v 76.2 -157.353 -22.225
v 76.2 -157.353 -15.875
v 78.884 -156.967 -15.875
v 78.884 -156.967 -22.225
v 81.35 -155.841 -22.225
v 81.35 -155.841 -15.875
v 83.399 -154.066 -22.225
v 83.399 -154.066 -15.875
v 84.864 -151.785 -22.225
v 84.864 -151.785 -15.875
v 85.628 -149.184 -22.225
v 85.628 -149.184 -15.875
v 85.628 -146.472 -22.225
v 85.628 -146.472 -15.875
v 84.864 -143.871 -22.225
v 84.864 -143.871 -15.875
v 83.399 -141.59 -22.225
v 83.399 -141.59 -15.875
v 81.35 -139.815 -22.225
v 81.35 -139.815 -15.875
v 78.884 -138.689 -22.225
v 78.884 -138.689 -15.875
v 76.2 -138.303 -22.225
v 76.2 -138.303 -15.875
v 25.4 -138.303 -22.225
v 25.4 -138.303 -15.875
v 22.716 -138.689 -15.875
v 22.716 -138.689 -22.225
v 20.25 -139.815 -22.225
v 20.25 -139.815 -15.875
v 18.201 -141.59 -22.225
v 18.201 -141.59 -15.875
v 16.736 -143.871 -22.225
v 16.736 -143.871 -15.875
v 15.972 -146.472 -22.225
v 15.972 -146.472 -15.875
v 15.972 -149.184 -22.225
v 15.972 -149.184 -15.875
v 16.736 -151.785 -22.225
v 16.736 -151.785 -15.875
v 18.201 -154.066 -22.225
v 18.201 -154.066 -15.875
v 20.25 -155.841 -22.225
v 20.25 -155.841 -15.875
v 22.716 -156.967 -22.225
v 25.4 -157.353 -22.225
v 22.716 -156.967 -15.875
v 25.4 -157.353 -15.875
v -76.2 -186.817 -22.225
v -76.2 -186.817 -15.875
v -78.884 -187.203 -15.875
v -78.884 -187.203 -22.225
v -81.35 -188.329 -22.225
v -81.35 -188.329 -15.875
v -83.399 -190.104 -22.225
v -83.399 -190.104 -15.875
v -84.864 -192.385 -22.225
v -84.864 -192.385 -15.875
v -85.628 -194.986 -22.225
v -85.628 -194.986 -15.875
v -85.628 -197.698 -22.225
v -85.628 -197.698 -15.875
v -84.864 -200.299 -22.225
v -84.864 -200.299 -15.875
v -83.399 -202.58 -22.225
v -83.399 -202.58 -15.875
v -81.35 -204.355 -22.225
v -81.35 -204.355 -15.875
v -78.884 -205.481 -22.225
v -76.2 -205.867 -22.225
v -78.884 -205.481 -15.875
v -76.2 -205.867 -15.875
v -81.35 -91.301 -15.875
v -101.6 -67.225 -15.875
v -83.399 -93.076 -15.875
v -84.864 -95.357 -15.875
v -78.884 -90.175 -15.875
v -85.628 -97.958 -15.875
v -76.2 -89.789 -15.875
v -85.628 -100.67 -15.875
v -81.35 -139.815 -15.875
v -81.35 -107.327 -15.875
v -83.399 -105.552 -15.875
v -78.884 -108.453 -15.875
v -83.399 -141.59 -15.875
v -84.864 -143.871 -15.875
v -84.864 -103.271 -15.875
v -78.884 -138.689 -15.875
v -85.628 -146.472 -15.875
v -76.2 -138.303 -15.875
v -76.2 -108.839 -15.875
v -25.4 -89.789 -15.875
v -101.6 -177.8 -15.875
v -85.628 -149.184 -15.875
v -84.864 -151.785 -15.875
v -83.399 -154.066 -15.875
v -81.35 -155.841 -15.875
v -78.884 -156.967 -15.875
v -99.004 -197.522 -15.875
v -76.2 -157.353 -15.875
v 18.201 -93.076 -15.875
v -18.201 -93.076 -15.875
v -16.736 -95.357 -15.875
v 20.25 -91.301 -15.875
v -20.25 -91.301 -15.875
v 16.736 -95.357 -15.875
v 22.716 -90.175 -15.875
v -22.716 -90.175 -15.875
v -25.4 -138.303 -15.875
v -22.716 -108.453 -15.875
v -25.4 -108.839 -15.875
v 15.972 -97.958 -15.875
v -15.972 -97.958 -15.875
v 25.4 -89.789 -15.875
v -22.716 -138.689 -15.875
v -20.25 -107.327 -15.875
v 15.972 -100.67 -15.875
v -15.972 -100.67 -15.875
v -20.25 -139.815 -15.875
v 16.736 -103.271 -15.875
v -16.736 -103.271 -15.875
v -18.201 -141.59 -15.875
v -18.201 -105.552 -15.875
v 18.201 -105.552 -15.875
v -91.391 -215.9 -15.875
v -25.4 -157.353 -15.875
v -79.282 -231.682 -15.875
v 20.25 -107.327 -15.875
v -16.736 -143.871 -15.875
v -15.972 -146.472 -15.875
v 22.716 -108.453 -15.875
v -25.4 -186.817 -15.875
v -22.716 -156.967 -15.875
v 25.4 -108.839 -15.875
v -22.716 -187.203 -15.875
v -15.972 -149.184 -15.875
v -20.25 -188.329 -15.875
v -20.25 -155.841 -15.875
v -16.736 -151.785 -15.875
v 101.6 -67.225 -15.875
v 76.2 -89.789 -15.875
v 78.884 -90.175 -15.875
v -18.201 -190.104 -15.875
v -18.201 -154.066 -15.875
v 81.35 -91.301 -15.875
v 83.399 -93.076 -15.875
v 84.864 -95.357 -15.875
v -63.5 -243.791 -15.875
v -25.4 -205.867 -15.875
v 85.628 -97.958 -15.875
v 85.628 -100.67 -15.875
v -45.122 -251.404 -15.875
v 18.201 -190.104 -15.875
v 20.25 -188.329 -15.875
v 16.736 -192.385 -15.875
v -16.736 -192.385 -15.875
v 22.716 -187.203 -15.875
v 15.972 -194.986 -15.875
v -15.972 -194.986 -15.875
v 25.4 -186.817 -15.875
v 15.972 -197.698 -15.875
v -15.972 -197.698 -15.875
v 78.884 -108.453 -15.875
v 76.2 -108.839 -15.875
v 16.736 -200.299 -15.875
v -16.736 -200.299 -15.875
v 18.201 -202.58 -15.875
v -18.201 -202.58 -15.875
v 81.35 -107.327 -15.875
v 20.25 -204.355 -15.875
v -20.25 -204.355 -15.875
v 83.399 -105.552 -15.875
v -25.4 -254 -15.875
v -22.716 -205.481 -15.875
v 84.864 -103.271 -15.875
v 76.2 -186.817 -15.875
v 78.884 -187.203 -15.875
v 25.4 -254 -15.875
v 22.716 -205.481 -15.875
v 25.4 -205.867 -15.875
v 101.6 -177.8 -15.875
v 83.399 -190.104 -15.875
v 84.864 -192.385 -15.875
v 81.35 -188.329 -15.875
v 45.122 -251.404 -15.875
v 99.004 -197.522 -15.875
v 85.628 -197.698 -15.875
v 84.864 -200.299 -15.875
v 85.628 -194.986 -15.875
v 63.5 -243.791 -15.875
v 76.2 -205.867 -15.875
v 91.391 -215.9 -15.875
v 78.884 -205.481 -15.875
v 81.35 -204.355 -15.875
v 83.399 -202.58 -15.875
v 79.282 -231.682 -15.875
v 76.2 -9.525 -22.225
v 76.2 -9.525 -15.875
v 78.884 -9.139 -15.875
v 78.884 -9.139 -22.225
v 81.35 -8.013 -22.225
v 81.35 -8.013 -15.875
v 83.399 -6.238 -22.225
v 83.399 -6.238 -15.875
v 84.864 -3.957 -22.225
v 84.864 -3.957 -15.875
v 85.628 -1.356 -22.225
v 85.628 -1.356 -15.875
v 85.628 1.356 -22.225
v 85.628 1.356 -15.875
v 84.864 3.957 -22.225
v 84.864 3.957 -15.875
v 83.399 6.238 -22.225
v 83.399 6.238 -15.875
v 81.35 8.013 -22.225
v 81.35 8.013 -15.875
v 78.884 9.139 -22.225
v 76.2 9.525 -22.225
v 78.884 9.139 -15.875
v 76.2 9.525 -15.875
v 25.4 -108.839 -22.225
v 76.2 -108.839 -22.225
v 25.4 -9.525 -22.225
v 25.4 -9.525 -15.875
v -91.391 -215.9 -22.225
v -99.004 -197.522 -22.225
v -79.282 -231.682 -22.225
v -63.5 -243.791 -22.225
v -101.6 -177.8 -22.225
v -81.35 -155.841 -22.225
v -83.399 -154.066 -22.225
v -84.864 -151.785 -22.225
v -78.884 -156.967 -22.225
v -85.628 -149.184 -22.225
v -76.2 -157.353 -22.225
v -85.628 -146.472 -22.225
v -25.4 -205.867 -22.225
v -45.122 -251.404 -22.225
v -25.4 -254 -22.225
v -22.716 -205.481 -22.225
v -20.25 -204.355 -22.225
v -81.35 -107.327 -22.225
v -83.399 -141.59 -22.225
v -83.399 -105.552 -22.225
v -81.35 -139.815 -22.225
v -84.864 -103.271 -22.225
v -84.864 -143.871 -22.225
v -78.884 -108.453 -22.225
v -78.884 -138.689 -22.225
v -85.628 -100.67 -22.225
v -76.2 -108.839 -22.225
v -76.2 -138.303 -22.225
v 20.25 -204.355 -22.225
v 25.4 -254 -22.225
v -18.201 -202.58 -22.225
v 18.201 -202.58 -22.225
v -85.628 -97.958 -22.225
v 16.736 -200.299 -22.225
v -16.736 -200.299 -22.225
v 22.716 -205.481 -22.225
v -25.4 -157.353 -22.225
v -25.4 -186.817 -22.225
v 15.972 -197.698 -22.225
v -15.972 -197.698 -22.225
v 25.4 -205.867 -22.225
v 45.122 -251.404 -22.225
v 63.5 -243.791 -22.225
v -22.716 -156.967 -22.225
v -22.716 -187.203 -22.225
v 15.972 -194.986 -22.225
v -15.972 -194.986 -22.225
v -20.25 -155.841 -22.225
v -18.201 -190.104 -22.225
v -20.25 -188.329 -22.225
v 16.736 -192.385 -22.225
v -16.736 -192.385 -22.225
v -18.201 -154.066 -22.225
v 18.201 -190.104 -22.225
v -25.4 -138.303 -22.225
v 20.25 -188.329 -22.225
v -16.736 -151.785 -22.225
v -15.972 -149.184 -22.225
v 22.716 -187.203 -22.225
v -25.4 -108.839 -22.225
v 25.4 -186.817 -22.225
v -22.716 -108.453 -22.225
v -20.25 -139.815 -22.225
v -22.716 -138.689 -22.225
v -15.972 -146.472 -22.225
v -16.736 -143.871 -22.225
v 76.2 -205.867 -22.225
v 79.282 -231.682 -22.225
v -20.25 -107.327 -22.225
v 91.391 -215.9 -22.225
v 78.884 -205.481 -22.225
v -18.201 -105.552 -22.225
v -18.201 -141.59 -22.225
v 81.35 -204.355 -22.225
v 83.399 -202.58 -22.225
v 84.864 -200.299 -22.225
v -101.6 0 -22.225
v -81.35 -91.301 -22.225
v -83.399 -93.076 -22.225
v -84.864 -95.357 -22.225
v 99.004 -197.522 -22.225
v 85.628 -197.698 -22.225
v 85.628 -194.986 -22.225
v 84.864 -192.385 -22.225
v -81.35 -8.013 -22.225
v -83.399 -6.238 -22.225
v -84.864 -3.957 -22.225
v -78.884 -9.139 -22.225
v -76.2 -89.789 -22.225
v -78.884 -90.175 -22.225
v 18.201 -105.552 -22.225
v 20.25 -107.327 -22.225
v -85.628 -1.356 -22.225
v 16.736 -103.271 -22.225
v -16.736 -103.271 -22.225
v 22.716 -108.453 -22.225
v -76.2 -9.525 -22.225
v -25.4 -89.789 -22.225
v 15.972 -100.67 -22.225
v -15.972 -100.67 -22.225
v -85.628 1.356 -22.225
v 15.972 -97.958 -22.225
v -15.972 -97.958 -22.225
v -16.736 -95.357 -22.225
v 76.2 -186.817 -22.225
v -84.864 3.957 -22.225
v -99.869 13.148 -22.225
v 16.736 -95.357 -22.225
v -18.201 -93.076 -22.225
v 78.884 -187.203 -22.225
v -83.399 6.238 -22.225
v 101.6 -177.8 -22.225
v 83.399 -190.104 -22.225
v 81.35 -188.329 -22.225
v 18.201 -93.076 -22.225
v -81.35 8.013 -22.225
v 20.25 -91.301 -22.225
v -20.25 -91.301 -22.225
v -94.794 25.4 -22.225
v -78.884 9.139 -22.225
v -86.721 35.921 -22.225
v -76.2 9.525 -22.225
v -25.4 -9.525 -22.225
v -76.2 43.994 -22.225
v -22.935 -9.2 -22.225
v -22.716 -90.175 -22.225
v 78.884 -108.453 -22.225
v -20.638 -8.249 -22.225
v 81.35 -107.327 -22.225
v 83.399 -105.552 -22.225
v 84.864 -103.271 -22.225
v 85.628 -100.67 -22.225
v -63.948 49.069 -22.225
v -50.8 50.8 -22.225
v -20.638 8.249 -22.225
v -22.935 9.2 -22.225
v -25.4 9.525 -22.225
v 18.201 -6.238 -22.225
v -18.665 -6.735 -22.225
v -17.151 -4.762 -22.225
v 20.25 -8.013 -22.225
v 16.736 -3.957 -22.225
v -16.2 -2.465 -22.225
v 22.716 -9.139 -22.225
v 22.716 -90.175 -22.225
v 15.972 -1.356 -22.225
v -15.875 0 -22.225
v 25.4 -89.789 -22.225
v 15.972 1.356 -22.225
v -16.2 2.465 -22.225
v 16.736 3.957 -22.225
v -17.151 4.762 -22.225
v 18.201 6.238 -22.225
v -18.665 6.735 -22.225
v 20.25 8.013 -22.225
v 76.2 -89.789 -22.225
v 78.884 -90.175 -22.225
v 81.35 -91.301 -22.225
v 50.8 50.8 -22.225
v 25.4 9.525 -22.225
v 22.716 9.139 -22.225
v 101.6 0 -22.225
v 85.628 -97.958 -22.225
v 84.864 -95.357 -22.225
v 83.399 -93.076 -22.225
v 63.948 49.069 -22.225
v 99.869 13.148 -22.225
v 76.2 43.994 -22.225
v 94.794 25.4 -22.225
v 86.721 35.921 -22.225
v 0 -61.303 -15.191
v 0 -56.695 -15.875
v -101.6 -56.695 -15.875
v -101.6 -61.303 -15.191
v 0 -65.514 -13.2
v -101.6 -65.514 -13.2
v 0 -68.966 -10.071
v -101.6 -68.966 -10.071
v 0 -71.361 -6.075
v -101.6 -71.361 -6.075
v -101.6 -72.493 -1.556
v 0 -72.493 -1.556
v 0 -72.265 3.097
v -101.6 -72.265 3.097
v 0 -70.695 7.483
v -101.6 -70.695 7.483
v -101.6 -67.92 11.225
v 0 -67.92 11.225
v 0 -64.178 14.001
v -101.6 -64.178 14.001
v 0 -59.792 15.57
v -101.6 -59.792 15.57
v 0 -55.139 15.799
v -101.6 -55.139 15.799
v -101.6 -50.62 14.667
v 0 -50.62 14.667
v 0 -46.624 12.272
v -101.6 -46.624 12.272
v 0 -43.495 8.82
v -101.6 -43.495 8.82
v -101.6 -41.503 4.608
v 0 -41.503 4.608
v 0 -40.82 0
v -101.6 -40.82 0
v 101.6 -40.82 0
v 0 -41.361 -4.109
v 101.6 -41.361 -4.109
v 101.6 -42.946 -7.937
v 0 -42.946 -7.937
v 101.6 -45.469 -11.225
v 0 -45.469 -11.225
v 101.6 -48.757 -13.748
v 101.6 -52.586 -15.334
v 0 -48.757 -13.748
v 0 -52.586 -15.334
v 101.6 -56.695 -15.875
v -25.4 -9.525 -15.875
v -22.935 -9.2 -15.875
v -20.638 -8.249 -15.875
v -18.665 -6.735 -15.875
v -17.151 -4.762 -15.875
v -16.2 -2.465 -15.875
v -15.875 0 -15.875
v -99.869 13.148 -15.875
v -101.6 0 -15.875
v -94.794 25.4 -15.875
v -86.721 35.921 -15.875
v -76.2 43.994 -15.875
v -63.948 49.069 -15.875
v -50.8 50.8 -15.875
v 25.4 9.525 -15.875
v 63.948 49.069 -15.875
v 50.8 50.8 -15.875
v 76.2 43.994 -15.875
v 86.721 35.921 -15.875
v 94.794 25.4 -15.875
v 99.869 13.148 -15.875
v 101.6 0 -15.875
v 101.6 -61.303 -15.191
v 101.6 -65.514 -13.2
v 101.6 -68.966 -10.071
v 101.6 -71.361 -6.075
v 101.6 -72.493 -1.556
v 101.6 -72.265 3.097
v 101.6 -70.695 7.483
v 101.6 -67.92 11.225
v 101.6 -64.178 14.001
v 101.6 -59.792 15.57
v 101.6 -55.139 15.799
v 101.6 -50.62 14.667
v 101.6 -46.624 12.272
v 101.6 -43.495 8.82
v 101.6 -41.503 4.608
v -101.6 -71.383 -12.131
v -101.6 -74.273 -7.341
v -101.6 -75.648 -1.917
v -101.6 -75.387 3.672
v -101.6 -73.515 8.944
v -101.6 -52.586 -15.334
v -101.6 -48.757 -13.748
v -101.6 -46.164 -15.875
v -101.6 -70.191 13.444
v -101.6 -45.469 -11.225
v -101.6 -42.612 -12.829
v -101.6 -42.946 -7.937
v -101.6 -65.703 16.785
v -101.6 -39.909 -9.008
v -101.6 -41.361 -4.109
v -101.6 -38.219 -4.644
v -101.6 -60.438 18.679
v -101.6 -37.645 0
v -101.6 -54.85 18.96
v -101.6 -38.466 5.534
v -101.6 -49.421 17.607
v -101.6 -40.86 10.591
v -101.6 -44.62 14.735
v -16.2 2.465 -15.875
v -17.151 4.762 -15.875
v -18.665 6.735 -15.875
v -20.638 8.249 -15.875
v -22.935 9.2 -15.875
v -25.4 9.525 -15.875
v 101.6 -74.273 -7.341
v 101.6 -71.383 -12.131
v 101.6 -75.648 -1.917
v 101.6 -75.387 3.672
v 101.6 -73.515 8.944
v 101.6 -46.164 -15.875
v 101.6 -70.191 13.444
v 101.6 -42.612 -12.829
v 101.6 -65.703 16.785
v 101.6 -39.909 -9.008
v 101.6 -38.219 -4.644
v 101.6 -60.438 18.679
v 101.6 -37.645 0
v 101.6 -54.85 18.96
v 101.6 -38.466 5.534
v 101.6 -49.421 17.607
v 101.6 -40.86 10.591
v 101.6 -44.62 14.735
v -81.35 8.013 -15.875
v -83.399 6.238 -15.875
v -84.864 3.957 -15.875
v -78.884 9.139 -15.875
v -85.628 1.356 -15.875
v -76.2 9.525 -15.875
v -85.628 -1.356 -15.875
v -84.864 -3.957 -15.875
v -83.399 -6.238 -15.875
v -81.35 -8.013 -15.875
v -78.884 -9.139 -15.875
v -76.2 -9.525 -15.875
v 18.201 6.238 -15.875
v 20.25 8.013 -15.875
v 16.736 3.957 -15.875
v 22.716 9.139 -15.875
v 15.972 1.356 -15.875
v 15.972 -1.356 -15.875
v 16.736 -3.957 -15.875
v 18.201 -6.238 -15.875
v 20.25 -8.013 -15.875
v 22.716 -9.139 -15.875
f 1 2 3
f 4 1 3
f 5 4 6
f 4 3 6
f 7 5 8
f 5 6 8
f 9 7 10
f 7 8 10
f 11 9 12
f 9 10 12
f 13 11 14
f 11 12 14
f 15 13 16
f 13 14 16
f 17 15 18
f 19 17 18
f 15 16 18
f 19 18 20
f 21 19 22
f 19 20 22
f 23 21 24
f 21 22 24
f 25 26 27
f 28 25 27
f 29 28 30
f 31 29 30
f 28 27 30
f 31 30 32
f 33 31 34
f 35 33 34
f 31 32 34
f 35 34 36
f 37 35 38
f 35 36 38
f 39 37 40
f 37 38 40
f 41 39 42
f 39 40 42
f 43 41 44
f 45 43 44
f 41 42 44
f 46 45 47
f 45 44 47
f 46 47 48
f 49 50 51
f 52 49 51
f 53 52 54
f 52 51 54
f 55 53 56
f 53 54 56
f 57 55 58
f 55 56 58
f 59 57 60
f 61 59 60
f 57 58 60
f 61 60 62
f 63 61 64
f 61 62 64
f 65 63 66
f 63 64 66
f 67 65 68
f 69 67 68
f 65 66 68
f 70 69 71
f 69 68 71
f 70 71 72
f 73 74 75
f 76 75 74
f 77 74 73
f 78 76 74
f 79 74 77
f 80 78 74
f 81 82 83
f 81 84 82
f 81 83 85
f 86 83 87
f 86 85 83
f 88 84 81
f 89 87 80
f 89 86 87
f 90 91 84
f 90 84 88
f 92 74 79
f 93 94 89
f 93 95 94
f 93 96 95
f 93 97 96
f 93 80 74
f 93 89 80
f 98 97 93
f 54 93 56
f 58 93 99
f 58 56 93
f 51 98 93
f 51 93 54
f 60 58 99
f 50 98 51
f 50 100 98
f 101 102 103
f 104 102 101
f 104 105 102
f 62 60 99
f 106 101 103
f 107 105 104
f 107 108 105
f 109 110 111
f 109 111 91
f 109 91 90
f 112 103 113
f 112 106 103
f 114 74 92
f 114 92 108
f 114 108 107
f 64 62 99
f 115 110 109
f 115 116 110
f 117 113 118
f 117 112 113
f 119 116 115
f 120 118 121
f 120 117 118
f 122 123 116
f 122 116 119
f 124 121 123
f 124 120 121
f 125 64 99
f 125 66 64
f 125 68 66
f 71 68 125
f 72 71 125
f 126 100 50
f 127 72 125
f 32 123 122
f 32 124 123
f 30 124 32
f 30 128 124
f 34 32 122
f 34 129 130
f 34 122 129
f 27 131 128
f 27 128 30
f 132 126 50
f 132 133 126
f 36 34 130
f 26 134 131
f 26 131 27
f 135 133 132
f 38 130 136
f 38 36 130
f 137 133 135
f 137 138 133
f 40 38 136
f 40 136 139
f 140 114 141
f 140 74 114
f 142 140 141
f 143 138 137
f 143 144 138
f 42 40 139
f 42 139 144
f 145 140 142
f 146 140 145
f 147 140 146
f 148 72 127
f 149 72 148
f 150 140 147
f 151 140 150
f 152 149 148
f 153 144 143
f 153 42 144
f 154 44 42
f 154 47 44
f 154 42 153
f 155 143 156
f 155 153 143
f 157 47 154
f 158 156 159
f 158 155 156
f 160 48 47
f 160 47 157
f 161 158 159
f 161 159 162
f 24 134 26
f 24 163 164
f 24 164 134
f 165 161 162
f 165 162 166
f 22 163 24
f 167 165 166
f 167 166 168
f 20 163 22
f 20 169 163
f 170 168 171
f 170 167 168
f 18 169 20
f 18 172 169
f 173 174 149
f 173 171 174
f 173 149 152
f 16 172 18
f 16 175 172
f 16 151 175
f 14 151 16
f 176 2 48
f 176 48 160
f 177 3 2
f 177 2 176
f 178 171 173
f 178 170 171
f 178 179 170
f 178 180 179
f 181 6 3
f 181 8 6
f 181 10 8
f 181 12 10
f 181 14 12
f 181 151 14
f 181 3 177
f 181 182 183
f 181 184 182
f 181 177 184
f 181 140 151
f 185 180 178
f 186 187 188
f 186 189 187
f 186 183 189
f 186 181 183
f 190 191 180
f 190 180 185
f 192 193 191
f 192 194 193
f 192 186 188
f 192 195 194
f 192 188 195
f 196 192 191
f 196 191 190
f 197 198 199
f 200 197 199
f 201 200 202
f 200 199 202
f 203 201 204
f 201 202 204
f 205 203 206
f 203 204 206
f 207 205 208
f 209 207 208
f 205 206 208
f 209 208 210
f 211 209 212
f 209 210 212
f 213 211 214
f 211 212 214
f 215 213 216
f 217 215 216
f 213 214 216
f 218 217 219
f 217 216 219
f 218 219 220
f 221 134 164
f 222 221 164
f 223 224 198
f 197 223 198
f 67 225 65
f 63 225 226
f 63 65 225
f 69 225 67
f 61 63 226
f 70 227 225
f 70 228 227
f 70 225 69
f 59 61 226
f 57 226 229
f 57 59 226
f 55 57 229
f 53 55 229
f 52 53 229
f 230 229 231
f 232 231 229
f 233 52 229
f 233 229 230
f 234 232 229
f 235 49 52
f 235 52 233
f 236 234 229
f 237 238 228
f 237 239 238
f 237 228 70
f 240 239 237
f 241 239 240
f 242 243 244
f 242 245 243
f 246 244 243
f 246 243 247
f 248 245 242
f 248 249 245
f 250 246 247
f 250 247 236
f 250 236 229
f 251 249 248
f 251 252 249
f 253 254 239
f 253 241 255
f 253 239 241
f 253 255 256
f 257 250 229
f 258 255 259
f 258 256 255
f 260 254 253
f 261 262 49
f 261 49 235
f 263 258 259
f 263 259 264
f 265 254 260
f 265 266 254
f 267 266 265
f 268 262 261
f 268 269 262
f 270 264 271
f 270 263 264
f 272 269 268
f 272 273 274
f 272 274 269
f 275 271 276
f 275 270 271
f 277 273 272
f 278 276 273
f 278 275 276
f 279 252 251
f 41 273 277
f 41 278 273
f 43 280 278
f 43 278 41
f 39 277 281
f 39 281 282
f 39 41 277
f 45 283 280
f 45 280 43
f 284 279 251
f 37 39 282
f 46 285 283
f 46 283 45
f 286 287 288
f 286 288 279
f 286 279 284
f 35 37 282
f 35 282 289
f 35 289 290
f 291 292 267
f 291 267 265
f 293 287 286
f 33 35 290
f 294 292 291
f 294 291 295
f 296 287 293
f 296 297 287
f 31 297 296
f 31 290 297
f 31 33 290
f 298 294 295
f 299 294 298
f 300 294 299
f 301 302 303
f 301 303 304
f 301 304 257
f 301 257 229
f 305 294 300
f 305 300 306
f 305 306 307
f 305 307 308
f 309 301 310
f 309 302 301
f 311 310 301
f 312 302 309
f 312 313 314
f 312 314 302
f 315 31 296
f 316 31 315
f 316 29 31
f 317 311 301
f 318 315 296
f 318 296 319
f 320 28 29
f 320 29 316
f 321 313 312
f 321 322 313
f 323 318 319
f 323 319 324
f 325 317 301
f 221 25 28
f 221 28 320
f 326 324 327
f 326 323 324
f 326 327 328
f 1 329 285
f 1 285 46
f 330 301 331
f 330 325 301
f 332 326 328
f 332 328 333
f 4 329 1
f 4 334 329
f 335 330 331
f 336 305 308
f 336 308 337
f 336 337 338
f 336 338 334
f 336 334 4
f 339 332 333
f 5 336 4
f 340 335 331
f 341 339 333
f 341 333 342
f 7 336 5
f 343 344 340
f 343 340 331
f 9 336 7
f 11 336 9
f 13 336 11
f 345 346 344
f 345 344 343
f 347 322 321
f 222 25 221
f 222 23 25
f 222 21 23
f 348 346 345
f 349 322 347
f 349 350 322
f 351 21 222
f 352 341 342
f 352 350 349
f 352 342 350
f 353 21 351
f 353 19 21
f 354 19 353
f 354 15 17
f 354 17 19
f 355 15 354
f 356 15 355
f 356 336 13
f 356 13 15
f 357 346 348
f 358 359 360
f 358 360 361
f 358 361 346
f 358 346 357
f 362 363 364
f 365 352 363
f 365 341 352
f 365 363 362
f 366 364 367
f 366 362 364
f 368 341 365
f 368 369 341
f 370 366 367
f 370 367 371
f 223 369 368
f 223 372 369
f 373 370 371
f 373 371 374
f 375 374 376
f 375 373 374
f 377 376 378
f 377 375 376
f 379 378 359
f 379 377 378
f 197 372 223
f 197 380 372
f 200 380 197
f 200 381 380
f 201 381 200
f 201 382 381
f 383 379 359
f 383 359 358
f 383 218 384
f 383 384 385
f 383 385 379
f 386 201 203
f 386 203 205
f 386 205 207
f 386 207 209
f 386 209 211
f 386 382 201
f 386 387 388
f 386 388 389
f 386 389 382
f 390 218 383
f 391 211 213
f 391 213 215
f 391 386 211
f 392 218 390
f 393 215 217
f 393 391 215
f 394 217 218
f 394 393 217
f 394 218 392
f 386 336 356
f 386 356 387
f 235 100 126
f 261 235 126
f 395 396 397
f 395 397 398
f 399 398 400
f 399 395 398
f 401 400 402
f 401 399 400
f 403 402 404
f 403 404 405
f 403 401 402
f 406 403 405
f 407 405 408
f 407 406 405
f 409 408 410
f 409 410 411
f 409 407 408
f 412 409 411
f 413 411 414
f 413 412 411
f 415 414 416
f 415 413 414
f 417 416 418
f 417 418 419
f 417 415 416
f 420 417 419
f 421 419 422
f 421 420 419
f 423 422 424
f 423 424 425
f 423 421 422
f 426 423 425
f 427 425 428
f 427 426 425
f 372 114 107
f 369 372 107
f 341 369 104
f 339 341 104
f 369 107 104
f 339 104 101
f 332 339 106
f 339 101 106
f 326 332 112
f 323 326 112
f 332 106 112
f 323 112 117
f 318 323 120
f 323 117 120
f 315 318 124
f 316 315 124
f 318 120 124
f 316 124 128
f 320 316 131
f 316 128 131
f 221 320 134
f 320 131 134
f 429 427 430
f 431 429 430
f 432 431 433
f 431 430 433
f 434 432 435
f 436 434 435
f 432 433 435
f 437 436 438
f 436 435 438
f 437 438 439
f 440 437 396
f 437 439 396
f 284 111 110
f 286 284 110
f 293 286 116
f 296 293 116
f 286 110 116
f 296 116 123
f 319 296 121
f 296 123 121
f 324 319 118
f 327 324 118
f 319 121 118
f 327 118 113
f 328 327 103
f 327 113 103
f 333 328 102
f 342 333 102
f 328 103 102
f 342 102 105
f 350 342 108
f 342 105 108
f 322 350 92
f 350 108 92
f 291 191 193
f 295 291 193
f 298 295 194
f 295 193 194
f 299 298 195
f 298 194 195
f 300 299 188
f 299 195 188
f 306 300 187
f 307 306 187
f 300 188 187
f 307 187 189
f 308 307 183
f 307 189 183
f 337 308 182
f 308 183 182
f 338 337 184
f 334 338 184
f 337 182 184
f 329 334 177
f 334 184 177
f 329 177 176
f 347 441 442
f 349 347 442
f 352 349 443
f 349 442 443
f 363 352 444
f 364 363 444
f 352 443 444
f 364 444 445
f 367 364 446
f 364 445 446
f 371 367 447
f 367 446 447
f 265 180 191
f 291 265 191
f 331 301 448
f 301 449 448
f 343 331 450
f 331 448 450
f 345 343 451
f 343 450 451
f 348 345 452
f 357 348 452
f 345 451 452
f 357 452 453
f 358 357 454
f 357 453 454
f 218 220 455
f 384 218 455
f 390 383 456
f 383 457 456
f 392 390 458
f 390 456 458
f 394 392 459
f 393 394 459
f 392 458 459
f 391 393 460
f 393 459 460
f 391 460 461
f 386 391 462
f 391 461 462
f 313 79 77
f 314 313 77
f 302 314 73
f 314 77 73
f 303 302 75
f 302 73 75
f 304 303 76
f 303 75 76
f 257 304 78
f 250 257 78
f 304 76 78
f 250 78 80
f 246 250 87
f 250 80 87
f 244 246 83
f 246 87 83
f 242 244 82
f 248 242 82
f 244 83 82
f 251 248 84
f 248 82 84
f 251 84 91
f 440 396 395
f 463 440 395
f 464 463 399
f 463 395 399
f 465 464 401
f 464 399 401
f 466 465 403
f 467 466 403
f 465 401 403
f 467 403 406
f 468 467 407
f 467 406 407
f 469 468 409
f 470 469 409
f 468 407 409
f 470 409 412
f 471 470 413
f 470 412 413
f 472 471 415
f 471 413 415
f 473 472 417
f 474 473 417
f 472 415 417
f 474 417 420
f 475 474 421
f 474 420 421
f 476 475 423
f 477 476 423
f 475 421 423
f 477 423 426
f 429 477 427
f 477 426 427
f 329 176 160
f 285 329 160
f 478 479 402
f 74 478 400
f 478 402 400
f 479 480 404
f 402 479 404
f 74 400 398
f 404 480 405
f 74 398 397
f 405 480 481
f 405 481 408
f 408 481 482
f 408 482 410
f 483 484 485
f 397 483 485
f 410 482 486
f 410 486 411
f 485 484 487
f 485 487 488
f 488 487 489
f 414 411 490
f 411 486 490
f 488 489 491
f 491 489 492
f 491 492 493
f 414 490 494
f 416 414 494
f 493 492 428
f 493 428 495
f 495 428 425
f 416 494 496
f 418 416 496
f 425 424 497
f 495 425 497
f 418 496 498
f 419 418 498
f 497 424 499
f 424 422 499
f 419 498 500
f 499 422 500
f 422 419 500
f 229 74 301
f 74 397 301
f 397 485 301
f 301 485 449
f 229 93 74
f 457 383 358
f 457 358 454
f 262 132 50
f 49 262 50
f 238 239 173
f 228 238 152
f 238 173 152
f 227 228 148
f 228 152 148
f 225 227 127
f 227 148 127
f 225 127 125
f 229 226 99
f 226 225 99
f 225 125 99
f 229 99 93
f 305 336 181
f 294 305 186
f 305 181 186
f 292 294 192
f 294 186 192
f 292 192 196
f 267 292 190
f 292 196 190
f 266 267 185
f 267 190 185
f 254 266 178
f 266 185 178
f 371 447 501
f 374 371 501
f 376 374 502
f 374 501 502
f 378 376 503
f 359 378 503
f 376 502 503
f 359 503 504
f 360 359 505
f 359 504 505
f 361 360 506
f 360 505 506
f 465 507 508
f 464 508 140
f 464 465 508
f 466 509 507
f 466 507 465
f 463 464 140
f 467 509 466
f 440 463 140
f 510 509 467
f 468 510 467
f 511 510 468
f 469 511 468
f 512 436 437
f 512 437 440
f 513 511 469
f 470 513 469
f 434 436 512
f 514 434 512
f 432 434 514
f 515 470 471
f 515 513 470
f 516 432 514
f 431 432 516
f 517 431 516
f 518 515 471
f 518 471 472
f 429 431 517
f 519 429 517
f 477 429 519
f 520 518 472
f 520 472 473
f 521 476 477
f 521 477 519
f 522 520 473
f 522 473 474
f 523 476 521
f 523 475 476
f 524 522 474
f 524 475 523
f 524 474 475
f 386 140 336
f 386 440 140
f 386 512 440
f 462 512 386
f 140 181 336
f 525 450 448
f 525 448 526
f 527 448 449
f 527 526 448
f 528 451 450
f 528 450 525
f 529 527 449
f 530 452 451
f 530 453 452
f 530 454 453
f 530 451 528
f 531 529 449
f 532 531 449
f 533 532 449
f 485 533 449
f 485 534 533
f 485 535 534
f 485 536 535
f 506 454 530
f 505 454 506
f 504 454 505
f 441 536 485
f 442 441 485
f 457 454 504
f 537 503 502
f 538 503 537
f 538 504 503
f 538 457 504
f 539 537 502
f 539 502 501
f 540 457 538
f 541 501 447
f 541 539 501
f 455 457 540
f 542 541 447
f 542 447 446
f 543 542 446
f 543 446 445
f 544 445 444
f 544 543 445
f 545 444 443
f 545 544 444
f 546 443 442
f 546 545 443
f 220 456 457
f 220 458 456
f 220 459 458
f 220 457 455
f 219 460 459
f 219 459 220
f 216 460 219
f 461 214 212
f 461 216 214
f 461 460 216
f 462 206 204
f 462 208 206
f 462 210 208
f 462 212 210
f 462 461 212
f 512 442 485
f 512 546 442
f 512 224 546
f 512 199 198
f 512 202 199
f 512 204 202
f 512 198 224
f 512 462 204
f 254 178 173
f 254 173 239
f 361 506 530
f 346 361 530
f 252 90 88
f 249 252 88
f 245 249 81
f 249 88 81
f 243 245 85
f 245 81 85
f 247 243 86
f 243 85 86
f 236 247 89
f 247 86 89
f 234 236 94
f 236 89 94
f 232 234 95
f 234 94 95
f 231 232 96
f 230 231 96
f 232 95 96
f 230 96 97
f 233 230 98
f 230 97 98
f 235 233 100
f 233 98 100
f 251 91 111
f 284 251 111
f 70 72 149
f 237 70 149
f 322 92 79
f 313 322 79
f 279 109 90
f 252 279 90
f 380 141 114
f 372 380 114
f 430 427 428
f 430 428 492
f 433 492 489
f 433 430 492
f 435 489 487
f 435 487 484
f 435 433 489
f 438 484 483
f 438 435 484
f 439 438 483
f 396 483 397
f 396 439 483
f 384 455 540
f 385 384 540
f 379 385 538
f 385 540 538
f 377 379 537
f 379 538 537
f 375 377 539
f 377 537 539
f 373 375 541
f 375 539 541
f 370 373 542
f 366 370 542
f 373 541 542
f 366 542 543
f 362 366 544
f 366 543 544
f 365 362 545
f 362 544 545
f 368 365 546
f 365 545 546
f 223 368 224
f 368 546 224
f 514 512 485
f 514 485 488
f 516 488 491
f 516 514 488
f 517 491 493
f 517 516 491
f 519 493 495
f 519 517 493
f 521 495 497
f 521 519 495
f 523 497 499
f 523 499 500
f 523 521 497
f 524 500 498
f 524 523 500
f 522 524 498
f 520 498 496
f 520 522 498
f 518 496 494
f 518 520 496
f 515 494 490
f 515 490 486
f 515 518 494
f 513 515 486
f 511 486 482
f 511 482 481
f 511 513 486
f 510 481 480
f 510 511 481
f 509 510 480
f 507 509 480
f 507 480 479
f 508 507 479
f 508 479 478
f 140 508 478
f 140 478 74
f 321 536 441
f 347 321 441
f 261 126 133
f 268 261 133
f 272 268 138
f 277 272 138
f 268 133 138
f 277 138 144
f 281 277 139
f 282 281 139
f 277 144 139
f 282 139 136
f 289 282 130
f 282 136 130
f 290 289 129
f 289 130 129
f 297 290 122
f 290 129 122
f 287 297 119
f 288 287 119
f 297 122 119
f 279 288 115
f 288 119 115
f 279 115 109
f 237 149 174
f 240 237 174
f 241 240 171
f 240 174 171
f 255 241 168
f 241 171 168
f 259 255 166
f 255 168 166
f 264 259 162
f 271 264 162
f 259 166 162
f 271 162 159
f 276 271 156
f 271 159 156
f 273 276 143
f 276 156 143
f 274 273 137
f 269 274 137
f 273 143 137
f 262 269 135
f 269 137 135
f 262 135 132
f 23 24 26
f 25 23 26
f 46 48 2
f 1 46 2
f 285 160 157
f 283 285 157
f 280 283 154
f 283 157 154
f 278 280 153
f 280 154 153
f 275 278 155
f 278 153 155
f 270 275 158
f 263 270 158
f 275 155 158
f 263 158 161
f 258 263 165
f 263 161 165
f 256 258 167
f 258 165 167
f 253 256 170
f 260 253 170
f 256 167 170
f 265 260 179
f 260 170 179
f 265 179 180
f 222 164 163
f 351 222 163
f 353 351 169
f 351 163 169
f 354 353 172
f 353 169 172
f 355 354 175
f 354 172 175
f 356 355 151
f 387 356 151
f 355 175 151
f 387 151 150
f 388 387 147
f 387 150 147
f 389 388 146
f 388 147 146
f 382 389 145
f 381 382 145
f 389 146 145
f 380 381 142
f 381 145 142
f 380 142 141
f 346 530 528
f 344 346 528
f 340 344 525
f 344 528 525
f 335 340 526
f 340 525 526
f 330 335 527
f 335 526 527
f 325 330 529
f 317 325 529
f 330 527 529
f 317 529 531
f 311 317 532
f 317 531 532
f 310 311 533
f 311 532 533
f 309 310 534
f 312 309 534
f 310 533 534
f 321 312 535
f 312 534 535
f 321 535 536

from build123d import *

# Parameters (mm, degrees)
F1_DEPTH      = 101.6
F1_DEPTH_BACK = 101.6
F3_DEPTH      = 25.4
F5_DEPTH      = 25.4
F6_R          = 50.8


with BuildPart() as f1:
    # F0 (on Right) → F1 (new body, two sides)
    with BuildSketch(Plane.YZ) as f1_sk:
        with BuildLine():
            Line((50.8, -15.875), (0, -15.875))
            Line((0, -15.875), (-46.1643691758, -15.875))
            ThreePointArc((-46.1643691758, -15.875), (-56.6946528852, -19.05), (-67.2249365946, -15.875))
            Line((-67.2249365946, -15.875), (-254, -15.875))
            Line((-254, -15.875), (-254, -22.225))
            Line((-254, -22.225), (50.8, -22.225))
            Line((50.8, -22.225), (50.8, -15.875))
        make_face()
        with BuildLine():
            ThreePointArc((-67.2249365946, -15.875), (-56.6946528852, -19.05), (-46.1643691758, -15.875))
            Line((-46.1643691758, -15.875), (-56.6946528852, -15.875))
            Line((-56.6946528852, -15.875), (-67.2249365946, -15.875))
        make_face()
        with BuildLine():
            Line((-56.6946528852, -15.875), (-46.1643691758, -15.875))
            ThreePointArc((-46.1643691758, -15.875), (-39.9091769512, -9.0083460007), (-37.6446528852, 0))
            ThreePointArc((-37.6446528852, 0), (-65.7029988859, 16.785475934), (-67.2249365946, -15.875))
            Line((-67.2249365946, -15.875), (-56.6946528852, -15.875))
        make_face()
        with BuildLine():
            ThreePointArc((-40.8196528852, 0), (-45.4693327339, -11.2253201513), (-56.6946528852, -15.875))
            ThreePointArc((-56.6946528852, -15.875), (-67.9199730365, 11.2253201513), (-40.8196528852, 0))
        make_face(mode=Mode.SUBTRACT)
    extrude(amount=F1_DEPTH)
    extrude(f1_sk.sketch, amount=-F1_DEPTH_BACK)

    # F2 (on face) → F3 (cut)
    with BuildSketch(Plane.XY.offset(-15.875)):
        with BuildLine():
            Line((-101.6, -177.8), (-101.6, -254))
            Line((-101.6, -254), (-25.4, -254))
            ThreePointArc((-25.4, -254), (-79.2815367264, -231.6815367264), (-101.6, -177.8))
        make_face()
        with BuildLine():
            Line((101.6, -254), (101.6, -177.8))
            ThreePointArc((101.6, -177.8), (79.2815367264, -231.6815367264), (25.4, -254))
            Line((25.4, -254), (101.6, -254))
        make_face()
    extrude(amount=-F3_DEPTH, mode=Mode.SUBTRACT)

    # F4 (on face) → F5 (cut)
    with BuildSketch(Plane.XY.offset(-15.875)):
        with BuildLine():
            ThreePointArc((25.4, 9.525), (15.875, 0), (25.4, -9.525))
            Line((25.4, -9.525), (76.2, -9.525))
            ThreePointArc((76.2, -9.525), (85.725, 0), (76.2, 9.525))
            Line((76.2, 9.525), (25.4, 9.525))
        make_face()
        with BuildLine():
            Line((-76.2, -9.525), (-25.4, -9.525))
            ThreePointArc((-25.4, -9.525), (-18.6648079092, -6.7351920908), (-15.875, 0))
            ThreePointArc((-15.875, 0), (-18.6648079092, 6.7351920908), (-25.4, 9.525))
            Line((-25.4, 9.525), (-76.2, 9.525))
            ThreePointArc((-76.2, 9.525), (-85.725, 0), (-76.2, -9.525))
        make_face()
        with BuildLine():
            Line((-25.4, -89.789), (-76.2, -89.789))
            ThreePointArc((-76.2, -89.789), (-85.725, -99.314), (-76.2, -108.839))
            Line((-76.2, -108.839), (-25.4, -108.839))
            ThreePointArc((-25.4, -108.839), (-15.875, -99.314), (-25.4, -89.789))
        make_face()
        with BuildLine():
            Line((-25.4, -138.303), (-76.2, -138.303))
            ThreePointArc((-76.2, -138.303), (-85.725, -147.828), (-76.2, -157.353))
            Line((-76.2, -157.353), (-25.4, -157.353))
            ThreePointArc((-25.4, -157.353), (-15.875, -147.828), (-25.4, -138.303))
        make_face()
        with BuildLine():
            Line((-25.4, -186.817), (-76.2, -186.817))
            ThreePointArc((-76.2, -186.817), (-85.725, -196.342), (-76.2, -205.867))
            Line((-76.2, -205.867), (-25.4, -205.867))
            ThreePointArc((-25.4, -205.867), (-15.875, -196.342), (-25.4, -186.817))
        make_face()
        with BuildLine():
            ThreePointArc((25.4, -186.817), (15.875, -196.342), (25.4, -205.867))
            Line((25.4, -205.867), (76.2, -205.867))
            ThreePointArc((76.2, -205.867), (85.725, -196.342), (76.2, -186.817))
            Line((76.2, -186.817), (25.4, -186.817))
        make_face()
        with BuildLine():
            ThreePointArc((25.4, -138.303), (15.875, -147.828), (25.4, -157.353))
            Line((25.4, -157.353), (76.2, -157.353))
            ThreePointArc((76.2, -157.353), (85.725, -147.828), (76.2, -138.303))
            Line((76.2, -138.303), (25.4, -138.303))
        make_face()
        with BuildLine():
            ThreePointArc((76.2, -108.839), (85.725, -99.314), (76.2, -89.789))
            Line((76.2, -89.789), (25.4, -89.789))
            ThreePointArc((25.4, -89.789), (15.875, -99.314), (25.4, -108.839))
            Line((25.4, -108.839), (76.2, -108.839))
        make_face()
    extrude(amount=-F5_DEPTH, mode=Mode.SUBTRACT)

    # F6
    f6_edges = [f1.edges().sort_by_distance(p)[0] for p in [
        (101.6, 50.8, -19.05),
        (-101.6, 50.8, -19.05),
    ]]
    fillet(f6_edges, radius=F6_R)


solid = f1.part
